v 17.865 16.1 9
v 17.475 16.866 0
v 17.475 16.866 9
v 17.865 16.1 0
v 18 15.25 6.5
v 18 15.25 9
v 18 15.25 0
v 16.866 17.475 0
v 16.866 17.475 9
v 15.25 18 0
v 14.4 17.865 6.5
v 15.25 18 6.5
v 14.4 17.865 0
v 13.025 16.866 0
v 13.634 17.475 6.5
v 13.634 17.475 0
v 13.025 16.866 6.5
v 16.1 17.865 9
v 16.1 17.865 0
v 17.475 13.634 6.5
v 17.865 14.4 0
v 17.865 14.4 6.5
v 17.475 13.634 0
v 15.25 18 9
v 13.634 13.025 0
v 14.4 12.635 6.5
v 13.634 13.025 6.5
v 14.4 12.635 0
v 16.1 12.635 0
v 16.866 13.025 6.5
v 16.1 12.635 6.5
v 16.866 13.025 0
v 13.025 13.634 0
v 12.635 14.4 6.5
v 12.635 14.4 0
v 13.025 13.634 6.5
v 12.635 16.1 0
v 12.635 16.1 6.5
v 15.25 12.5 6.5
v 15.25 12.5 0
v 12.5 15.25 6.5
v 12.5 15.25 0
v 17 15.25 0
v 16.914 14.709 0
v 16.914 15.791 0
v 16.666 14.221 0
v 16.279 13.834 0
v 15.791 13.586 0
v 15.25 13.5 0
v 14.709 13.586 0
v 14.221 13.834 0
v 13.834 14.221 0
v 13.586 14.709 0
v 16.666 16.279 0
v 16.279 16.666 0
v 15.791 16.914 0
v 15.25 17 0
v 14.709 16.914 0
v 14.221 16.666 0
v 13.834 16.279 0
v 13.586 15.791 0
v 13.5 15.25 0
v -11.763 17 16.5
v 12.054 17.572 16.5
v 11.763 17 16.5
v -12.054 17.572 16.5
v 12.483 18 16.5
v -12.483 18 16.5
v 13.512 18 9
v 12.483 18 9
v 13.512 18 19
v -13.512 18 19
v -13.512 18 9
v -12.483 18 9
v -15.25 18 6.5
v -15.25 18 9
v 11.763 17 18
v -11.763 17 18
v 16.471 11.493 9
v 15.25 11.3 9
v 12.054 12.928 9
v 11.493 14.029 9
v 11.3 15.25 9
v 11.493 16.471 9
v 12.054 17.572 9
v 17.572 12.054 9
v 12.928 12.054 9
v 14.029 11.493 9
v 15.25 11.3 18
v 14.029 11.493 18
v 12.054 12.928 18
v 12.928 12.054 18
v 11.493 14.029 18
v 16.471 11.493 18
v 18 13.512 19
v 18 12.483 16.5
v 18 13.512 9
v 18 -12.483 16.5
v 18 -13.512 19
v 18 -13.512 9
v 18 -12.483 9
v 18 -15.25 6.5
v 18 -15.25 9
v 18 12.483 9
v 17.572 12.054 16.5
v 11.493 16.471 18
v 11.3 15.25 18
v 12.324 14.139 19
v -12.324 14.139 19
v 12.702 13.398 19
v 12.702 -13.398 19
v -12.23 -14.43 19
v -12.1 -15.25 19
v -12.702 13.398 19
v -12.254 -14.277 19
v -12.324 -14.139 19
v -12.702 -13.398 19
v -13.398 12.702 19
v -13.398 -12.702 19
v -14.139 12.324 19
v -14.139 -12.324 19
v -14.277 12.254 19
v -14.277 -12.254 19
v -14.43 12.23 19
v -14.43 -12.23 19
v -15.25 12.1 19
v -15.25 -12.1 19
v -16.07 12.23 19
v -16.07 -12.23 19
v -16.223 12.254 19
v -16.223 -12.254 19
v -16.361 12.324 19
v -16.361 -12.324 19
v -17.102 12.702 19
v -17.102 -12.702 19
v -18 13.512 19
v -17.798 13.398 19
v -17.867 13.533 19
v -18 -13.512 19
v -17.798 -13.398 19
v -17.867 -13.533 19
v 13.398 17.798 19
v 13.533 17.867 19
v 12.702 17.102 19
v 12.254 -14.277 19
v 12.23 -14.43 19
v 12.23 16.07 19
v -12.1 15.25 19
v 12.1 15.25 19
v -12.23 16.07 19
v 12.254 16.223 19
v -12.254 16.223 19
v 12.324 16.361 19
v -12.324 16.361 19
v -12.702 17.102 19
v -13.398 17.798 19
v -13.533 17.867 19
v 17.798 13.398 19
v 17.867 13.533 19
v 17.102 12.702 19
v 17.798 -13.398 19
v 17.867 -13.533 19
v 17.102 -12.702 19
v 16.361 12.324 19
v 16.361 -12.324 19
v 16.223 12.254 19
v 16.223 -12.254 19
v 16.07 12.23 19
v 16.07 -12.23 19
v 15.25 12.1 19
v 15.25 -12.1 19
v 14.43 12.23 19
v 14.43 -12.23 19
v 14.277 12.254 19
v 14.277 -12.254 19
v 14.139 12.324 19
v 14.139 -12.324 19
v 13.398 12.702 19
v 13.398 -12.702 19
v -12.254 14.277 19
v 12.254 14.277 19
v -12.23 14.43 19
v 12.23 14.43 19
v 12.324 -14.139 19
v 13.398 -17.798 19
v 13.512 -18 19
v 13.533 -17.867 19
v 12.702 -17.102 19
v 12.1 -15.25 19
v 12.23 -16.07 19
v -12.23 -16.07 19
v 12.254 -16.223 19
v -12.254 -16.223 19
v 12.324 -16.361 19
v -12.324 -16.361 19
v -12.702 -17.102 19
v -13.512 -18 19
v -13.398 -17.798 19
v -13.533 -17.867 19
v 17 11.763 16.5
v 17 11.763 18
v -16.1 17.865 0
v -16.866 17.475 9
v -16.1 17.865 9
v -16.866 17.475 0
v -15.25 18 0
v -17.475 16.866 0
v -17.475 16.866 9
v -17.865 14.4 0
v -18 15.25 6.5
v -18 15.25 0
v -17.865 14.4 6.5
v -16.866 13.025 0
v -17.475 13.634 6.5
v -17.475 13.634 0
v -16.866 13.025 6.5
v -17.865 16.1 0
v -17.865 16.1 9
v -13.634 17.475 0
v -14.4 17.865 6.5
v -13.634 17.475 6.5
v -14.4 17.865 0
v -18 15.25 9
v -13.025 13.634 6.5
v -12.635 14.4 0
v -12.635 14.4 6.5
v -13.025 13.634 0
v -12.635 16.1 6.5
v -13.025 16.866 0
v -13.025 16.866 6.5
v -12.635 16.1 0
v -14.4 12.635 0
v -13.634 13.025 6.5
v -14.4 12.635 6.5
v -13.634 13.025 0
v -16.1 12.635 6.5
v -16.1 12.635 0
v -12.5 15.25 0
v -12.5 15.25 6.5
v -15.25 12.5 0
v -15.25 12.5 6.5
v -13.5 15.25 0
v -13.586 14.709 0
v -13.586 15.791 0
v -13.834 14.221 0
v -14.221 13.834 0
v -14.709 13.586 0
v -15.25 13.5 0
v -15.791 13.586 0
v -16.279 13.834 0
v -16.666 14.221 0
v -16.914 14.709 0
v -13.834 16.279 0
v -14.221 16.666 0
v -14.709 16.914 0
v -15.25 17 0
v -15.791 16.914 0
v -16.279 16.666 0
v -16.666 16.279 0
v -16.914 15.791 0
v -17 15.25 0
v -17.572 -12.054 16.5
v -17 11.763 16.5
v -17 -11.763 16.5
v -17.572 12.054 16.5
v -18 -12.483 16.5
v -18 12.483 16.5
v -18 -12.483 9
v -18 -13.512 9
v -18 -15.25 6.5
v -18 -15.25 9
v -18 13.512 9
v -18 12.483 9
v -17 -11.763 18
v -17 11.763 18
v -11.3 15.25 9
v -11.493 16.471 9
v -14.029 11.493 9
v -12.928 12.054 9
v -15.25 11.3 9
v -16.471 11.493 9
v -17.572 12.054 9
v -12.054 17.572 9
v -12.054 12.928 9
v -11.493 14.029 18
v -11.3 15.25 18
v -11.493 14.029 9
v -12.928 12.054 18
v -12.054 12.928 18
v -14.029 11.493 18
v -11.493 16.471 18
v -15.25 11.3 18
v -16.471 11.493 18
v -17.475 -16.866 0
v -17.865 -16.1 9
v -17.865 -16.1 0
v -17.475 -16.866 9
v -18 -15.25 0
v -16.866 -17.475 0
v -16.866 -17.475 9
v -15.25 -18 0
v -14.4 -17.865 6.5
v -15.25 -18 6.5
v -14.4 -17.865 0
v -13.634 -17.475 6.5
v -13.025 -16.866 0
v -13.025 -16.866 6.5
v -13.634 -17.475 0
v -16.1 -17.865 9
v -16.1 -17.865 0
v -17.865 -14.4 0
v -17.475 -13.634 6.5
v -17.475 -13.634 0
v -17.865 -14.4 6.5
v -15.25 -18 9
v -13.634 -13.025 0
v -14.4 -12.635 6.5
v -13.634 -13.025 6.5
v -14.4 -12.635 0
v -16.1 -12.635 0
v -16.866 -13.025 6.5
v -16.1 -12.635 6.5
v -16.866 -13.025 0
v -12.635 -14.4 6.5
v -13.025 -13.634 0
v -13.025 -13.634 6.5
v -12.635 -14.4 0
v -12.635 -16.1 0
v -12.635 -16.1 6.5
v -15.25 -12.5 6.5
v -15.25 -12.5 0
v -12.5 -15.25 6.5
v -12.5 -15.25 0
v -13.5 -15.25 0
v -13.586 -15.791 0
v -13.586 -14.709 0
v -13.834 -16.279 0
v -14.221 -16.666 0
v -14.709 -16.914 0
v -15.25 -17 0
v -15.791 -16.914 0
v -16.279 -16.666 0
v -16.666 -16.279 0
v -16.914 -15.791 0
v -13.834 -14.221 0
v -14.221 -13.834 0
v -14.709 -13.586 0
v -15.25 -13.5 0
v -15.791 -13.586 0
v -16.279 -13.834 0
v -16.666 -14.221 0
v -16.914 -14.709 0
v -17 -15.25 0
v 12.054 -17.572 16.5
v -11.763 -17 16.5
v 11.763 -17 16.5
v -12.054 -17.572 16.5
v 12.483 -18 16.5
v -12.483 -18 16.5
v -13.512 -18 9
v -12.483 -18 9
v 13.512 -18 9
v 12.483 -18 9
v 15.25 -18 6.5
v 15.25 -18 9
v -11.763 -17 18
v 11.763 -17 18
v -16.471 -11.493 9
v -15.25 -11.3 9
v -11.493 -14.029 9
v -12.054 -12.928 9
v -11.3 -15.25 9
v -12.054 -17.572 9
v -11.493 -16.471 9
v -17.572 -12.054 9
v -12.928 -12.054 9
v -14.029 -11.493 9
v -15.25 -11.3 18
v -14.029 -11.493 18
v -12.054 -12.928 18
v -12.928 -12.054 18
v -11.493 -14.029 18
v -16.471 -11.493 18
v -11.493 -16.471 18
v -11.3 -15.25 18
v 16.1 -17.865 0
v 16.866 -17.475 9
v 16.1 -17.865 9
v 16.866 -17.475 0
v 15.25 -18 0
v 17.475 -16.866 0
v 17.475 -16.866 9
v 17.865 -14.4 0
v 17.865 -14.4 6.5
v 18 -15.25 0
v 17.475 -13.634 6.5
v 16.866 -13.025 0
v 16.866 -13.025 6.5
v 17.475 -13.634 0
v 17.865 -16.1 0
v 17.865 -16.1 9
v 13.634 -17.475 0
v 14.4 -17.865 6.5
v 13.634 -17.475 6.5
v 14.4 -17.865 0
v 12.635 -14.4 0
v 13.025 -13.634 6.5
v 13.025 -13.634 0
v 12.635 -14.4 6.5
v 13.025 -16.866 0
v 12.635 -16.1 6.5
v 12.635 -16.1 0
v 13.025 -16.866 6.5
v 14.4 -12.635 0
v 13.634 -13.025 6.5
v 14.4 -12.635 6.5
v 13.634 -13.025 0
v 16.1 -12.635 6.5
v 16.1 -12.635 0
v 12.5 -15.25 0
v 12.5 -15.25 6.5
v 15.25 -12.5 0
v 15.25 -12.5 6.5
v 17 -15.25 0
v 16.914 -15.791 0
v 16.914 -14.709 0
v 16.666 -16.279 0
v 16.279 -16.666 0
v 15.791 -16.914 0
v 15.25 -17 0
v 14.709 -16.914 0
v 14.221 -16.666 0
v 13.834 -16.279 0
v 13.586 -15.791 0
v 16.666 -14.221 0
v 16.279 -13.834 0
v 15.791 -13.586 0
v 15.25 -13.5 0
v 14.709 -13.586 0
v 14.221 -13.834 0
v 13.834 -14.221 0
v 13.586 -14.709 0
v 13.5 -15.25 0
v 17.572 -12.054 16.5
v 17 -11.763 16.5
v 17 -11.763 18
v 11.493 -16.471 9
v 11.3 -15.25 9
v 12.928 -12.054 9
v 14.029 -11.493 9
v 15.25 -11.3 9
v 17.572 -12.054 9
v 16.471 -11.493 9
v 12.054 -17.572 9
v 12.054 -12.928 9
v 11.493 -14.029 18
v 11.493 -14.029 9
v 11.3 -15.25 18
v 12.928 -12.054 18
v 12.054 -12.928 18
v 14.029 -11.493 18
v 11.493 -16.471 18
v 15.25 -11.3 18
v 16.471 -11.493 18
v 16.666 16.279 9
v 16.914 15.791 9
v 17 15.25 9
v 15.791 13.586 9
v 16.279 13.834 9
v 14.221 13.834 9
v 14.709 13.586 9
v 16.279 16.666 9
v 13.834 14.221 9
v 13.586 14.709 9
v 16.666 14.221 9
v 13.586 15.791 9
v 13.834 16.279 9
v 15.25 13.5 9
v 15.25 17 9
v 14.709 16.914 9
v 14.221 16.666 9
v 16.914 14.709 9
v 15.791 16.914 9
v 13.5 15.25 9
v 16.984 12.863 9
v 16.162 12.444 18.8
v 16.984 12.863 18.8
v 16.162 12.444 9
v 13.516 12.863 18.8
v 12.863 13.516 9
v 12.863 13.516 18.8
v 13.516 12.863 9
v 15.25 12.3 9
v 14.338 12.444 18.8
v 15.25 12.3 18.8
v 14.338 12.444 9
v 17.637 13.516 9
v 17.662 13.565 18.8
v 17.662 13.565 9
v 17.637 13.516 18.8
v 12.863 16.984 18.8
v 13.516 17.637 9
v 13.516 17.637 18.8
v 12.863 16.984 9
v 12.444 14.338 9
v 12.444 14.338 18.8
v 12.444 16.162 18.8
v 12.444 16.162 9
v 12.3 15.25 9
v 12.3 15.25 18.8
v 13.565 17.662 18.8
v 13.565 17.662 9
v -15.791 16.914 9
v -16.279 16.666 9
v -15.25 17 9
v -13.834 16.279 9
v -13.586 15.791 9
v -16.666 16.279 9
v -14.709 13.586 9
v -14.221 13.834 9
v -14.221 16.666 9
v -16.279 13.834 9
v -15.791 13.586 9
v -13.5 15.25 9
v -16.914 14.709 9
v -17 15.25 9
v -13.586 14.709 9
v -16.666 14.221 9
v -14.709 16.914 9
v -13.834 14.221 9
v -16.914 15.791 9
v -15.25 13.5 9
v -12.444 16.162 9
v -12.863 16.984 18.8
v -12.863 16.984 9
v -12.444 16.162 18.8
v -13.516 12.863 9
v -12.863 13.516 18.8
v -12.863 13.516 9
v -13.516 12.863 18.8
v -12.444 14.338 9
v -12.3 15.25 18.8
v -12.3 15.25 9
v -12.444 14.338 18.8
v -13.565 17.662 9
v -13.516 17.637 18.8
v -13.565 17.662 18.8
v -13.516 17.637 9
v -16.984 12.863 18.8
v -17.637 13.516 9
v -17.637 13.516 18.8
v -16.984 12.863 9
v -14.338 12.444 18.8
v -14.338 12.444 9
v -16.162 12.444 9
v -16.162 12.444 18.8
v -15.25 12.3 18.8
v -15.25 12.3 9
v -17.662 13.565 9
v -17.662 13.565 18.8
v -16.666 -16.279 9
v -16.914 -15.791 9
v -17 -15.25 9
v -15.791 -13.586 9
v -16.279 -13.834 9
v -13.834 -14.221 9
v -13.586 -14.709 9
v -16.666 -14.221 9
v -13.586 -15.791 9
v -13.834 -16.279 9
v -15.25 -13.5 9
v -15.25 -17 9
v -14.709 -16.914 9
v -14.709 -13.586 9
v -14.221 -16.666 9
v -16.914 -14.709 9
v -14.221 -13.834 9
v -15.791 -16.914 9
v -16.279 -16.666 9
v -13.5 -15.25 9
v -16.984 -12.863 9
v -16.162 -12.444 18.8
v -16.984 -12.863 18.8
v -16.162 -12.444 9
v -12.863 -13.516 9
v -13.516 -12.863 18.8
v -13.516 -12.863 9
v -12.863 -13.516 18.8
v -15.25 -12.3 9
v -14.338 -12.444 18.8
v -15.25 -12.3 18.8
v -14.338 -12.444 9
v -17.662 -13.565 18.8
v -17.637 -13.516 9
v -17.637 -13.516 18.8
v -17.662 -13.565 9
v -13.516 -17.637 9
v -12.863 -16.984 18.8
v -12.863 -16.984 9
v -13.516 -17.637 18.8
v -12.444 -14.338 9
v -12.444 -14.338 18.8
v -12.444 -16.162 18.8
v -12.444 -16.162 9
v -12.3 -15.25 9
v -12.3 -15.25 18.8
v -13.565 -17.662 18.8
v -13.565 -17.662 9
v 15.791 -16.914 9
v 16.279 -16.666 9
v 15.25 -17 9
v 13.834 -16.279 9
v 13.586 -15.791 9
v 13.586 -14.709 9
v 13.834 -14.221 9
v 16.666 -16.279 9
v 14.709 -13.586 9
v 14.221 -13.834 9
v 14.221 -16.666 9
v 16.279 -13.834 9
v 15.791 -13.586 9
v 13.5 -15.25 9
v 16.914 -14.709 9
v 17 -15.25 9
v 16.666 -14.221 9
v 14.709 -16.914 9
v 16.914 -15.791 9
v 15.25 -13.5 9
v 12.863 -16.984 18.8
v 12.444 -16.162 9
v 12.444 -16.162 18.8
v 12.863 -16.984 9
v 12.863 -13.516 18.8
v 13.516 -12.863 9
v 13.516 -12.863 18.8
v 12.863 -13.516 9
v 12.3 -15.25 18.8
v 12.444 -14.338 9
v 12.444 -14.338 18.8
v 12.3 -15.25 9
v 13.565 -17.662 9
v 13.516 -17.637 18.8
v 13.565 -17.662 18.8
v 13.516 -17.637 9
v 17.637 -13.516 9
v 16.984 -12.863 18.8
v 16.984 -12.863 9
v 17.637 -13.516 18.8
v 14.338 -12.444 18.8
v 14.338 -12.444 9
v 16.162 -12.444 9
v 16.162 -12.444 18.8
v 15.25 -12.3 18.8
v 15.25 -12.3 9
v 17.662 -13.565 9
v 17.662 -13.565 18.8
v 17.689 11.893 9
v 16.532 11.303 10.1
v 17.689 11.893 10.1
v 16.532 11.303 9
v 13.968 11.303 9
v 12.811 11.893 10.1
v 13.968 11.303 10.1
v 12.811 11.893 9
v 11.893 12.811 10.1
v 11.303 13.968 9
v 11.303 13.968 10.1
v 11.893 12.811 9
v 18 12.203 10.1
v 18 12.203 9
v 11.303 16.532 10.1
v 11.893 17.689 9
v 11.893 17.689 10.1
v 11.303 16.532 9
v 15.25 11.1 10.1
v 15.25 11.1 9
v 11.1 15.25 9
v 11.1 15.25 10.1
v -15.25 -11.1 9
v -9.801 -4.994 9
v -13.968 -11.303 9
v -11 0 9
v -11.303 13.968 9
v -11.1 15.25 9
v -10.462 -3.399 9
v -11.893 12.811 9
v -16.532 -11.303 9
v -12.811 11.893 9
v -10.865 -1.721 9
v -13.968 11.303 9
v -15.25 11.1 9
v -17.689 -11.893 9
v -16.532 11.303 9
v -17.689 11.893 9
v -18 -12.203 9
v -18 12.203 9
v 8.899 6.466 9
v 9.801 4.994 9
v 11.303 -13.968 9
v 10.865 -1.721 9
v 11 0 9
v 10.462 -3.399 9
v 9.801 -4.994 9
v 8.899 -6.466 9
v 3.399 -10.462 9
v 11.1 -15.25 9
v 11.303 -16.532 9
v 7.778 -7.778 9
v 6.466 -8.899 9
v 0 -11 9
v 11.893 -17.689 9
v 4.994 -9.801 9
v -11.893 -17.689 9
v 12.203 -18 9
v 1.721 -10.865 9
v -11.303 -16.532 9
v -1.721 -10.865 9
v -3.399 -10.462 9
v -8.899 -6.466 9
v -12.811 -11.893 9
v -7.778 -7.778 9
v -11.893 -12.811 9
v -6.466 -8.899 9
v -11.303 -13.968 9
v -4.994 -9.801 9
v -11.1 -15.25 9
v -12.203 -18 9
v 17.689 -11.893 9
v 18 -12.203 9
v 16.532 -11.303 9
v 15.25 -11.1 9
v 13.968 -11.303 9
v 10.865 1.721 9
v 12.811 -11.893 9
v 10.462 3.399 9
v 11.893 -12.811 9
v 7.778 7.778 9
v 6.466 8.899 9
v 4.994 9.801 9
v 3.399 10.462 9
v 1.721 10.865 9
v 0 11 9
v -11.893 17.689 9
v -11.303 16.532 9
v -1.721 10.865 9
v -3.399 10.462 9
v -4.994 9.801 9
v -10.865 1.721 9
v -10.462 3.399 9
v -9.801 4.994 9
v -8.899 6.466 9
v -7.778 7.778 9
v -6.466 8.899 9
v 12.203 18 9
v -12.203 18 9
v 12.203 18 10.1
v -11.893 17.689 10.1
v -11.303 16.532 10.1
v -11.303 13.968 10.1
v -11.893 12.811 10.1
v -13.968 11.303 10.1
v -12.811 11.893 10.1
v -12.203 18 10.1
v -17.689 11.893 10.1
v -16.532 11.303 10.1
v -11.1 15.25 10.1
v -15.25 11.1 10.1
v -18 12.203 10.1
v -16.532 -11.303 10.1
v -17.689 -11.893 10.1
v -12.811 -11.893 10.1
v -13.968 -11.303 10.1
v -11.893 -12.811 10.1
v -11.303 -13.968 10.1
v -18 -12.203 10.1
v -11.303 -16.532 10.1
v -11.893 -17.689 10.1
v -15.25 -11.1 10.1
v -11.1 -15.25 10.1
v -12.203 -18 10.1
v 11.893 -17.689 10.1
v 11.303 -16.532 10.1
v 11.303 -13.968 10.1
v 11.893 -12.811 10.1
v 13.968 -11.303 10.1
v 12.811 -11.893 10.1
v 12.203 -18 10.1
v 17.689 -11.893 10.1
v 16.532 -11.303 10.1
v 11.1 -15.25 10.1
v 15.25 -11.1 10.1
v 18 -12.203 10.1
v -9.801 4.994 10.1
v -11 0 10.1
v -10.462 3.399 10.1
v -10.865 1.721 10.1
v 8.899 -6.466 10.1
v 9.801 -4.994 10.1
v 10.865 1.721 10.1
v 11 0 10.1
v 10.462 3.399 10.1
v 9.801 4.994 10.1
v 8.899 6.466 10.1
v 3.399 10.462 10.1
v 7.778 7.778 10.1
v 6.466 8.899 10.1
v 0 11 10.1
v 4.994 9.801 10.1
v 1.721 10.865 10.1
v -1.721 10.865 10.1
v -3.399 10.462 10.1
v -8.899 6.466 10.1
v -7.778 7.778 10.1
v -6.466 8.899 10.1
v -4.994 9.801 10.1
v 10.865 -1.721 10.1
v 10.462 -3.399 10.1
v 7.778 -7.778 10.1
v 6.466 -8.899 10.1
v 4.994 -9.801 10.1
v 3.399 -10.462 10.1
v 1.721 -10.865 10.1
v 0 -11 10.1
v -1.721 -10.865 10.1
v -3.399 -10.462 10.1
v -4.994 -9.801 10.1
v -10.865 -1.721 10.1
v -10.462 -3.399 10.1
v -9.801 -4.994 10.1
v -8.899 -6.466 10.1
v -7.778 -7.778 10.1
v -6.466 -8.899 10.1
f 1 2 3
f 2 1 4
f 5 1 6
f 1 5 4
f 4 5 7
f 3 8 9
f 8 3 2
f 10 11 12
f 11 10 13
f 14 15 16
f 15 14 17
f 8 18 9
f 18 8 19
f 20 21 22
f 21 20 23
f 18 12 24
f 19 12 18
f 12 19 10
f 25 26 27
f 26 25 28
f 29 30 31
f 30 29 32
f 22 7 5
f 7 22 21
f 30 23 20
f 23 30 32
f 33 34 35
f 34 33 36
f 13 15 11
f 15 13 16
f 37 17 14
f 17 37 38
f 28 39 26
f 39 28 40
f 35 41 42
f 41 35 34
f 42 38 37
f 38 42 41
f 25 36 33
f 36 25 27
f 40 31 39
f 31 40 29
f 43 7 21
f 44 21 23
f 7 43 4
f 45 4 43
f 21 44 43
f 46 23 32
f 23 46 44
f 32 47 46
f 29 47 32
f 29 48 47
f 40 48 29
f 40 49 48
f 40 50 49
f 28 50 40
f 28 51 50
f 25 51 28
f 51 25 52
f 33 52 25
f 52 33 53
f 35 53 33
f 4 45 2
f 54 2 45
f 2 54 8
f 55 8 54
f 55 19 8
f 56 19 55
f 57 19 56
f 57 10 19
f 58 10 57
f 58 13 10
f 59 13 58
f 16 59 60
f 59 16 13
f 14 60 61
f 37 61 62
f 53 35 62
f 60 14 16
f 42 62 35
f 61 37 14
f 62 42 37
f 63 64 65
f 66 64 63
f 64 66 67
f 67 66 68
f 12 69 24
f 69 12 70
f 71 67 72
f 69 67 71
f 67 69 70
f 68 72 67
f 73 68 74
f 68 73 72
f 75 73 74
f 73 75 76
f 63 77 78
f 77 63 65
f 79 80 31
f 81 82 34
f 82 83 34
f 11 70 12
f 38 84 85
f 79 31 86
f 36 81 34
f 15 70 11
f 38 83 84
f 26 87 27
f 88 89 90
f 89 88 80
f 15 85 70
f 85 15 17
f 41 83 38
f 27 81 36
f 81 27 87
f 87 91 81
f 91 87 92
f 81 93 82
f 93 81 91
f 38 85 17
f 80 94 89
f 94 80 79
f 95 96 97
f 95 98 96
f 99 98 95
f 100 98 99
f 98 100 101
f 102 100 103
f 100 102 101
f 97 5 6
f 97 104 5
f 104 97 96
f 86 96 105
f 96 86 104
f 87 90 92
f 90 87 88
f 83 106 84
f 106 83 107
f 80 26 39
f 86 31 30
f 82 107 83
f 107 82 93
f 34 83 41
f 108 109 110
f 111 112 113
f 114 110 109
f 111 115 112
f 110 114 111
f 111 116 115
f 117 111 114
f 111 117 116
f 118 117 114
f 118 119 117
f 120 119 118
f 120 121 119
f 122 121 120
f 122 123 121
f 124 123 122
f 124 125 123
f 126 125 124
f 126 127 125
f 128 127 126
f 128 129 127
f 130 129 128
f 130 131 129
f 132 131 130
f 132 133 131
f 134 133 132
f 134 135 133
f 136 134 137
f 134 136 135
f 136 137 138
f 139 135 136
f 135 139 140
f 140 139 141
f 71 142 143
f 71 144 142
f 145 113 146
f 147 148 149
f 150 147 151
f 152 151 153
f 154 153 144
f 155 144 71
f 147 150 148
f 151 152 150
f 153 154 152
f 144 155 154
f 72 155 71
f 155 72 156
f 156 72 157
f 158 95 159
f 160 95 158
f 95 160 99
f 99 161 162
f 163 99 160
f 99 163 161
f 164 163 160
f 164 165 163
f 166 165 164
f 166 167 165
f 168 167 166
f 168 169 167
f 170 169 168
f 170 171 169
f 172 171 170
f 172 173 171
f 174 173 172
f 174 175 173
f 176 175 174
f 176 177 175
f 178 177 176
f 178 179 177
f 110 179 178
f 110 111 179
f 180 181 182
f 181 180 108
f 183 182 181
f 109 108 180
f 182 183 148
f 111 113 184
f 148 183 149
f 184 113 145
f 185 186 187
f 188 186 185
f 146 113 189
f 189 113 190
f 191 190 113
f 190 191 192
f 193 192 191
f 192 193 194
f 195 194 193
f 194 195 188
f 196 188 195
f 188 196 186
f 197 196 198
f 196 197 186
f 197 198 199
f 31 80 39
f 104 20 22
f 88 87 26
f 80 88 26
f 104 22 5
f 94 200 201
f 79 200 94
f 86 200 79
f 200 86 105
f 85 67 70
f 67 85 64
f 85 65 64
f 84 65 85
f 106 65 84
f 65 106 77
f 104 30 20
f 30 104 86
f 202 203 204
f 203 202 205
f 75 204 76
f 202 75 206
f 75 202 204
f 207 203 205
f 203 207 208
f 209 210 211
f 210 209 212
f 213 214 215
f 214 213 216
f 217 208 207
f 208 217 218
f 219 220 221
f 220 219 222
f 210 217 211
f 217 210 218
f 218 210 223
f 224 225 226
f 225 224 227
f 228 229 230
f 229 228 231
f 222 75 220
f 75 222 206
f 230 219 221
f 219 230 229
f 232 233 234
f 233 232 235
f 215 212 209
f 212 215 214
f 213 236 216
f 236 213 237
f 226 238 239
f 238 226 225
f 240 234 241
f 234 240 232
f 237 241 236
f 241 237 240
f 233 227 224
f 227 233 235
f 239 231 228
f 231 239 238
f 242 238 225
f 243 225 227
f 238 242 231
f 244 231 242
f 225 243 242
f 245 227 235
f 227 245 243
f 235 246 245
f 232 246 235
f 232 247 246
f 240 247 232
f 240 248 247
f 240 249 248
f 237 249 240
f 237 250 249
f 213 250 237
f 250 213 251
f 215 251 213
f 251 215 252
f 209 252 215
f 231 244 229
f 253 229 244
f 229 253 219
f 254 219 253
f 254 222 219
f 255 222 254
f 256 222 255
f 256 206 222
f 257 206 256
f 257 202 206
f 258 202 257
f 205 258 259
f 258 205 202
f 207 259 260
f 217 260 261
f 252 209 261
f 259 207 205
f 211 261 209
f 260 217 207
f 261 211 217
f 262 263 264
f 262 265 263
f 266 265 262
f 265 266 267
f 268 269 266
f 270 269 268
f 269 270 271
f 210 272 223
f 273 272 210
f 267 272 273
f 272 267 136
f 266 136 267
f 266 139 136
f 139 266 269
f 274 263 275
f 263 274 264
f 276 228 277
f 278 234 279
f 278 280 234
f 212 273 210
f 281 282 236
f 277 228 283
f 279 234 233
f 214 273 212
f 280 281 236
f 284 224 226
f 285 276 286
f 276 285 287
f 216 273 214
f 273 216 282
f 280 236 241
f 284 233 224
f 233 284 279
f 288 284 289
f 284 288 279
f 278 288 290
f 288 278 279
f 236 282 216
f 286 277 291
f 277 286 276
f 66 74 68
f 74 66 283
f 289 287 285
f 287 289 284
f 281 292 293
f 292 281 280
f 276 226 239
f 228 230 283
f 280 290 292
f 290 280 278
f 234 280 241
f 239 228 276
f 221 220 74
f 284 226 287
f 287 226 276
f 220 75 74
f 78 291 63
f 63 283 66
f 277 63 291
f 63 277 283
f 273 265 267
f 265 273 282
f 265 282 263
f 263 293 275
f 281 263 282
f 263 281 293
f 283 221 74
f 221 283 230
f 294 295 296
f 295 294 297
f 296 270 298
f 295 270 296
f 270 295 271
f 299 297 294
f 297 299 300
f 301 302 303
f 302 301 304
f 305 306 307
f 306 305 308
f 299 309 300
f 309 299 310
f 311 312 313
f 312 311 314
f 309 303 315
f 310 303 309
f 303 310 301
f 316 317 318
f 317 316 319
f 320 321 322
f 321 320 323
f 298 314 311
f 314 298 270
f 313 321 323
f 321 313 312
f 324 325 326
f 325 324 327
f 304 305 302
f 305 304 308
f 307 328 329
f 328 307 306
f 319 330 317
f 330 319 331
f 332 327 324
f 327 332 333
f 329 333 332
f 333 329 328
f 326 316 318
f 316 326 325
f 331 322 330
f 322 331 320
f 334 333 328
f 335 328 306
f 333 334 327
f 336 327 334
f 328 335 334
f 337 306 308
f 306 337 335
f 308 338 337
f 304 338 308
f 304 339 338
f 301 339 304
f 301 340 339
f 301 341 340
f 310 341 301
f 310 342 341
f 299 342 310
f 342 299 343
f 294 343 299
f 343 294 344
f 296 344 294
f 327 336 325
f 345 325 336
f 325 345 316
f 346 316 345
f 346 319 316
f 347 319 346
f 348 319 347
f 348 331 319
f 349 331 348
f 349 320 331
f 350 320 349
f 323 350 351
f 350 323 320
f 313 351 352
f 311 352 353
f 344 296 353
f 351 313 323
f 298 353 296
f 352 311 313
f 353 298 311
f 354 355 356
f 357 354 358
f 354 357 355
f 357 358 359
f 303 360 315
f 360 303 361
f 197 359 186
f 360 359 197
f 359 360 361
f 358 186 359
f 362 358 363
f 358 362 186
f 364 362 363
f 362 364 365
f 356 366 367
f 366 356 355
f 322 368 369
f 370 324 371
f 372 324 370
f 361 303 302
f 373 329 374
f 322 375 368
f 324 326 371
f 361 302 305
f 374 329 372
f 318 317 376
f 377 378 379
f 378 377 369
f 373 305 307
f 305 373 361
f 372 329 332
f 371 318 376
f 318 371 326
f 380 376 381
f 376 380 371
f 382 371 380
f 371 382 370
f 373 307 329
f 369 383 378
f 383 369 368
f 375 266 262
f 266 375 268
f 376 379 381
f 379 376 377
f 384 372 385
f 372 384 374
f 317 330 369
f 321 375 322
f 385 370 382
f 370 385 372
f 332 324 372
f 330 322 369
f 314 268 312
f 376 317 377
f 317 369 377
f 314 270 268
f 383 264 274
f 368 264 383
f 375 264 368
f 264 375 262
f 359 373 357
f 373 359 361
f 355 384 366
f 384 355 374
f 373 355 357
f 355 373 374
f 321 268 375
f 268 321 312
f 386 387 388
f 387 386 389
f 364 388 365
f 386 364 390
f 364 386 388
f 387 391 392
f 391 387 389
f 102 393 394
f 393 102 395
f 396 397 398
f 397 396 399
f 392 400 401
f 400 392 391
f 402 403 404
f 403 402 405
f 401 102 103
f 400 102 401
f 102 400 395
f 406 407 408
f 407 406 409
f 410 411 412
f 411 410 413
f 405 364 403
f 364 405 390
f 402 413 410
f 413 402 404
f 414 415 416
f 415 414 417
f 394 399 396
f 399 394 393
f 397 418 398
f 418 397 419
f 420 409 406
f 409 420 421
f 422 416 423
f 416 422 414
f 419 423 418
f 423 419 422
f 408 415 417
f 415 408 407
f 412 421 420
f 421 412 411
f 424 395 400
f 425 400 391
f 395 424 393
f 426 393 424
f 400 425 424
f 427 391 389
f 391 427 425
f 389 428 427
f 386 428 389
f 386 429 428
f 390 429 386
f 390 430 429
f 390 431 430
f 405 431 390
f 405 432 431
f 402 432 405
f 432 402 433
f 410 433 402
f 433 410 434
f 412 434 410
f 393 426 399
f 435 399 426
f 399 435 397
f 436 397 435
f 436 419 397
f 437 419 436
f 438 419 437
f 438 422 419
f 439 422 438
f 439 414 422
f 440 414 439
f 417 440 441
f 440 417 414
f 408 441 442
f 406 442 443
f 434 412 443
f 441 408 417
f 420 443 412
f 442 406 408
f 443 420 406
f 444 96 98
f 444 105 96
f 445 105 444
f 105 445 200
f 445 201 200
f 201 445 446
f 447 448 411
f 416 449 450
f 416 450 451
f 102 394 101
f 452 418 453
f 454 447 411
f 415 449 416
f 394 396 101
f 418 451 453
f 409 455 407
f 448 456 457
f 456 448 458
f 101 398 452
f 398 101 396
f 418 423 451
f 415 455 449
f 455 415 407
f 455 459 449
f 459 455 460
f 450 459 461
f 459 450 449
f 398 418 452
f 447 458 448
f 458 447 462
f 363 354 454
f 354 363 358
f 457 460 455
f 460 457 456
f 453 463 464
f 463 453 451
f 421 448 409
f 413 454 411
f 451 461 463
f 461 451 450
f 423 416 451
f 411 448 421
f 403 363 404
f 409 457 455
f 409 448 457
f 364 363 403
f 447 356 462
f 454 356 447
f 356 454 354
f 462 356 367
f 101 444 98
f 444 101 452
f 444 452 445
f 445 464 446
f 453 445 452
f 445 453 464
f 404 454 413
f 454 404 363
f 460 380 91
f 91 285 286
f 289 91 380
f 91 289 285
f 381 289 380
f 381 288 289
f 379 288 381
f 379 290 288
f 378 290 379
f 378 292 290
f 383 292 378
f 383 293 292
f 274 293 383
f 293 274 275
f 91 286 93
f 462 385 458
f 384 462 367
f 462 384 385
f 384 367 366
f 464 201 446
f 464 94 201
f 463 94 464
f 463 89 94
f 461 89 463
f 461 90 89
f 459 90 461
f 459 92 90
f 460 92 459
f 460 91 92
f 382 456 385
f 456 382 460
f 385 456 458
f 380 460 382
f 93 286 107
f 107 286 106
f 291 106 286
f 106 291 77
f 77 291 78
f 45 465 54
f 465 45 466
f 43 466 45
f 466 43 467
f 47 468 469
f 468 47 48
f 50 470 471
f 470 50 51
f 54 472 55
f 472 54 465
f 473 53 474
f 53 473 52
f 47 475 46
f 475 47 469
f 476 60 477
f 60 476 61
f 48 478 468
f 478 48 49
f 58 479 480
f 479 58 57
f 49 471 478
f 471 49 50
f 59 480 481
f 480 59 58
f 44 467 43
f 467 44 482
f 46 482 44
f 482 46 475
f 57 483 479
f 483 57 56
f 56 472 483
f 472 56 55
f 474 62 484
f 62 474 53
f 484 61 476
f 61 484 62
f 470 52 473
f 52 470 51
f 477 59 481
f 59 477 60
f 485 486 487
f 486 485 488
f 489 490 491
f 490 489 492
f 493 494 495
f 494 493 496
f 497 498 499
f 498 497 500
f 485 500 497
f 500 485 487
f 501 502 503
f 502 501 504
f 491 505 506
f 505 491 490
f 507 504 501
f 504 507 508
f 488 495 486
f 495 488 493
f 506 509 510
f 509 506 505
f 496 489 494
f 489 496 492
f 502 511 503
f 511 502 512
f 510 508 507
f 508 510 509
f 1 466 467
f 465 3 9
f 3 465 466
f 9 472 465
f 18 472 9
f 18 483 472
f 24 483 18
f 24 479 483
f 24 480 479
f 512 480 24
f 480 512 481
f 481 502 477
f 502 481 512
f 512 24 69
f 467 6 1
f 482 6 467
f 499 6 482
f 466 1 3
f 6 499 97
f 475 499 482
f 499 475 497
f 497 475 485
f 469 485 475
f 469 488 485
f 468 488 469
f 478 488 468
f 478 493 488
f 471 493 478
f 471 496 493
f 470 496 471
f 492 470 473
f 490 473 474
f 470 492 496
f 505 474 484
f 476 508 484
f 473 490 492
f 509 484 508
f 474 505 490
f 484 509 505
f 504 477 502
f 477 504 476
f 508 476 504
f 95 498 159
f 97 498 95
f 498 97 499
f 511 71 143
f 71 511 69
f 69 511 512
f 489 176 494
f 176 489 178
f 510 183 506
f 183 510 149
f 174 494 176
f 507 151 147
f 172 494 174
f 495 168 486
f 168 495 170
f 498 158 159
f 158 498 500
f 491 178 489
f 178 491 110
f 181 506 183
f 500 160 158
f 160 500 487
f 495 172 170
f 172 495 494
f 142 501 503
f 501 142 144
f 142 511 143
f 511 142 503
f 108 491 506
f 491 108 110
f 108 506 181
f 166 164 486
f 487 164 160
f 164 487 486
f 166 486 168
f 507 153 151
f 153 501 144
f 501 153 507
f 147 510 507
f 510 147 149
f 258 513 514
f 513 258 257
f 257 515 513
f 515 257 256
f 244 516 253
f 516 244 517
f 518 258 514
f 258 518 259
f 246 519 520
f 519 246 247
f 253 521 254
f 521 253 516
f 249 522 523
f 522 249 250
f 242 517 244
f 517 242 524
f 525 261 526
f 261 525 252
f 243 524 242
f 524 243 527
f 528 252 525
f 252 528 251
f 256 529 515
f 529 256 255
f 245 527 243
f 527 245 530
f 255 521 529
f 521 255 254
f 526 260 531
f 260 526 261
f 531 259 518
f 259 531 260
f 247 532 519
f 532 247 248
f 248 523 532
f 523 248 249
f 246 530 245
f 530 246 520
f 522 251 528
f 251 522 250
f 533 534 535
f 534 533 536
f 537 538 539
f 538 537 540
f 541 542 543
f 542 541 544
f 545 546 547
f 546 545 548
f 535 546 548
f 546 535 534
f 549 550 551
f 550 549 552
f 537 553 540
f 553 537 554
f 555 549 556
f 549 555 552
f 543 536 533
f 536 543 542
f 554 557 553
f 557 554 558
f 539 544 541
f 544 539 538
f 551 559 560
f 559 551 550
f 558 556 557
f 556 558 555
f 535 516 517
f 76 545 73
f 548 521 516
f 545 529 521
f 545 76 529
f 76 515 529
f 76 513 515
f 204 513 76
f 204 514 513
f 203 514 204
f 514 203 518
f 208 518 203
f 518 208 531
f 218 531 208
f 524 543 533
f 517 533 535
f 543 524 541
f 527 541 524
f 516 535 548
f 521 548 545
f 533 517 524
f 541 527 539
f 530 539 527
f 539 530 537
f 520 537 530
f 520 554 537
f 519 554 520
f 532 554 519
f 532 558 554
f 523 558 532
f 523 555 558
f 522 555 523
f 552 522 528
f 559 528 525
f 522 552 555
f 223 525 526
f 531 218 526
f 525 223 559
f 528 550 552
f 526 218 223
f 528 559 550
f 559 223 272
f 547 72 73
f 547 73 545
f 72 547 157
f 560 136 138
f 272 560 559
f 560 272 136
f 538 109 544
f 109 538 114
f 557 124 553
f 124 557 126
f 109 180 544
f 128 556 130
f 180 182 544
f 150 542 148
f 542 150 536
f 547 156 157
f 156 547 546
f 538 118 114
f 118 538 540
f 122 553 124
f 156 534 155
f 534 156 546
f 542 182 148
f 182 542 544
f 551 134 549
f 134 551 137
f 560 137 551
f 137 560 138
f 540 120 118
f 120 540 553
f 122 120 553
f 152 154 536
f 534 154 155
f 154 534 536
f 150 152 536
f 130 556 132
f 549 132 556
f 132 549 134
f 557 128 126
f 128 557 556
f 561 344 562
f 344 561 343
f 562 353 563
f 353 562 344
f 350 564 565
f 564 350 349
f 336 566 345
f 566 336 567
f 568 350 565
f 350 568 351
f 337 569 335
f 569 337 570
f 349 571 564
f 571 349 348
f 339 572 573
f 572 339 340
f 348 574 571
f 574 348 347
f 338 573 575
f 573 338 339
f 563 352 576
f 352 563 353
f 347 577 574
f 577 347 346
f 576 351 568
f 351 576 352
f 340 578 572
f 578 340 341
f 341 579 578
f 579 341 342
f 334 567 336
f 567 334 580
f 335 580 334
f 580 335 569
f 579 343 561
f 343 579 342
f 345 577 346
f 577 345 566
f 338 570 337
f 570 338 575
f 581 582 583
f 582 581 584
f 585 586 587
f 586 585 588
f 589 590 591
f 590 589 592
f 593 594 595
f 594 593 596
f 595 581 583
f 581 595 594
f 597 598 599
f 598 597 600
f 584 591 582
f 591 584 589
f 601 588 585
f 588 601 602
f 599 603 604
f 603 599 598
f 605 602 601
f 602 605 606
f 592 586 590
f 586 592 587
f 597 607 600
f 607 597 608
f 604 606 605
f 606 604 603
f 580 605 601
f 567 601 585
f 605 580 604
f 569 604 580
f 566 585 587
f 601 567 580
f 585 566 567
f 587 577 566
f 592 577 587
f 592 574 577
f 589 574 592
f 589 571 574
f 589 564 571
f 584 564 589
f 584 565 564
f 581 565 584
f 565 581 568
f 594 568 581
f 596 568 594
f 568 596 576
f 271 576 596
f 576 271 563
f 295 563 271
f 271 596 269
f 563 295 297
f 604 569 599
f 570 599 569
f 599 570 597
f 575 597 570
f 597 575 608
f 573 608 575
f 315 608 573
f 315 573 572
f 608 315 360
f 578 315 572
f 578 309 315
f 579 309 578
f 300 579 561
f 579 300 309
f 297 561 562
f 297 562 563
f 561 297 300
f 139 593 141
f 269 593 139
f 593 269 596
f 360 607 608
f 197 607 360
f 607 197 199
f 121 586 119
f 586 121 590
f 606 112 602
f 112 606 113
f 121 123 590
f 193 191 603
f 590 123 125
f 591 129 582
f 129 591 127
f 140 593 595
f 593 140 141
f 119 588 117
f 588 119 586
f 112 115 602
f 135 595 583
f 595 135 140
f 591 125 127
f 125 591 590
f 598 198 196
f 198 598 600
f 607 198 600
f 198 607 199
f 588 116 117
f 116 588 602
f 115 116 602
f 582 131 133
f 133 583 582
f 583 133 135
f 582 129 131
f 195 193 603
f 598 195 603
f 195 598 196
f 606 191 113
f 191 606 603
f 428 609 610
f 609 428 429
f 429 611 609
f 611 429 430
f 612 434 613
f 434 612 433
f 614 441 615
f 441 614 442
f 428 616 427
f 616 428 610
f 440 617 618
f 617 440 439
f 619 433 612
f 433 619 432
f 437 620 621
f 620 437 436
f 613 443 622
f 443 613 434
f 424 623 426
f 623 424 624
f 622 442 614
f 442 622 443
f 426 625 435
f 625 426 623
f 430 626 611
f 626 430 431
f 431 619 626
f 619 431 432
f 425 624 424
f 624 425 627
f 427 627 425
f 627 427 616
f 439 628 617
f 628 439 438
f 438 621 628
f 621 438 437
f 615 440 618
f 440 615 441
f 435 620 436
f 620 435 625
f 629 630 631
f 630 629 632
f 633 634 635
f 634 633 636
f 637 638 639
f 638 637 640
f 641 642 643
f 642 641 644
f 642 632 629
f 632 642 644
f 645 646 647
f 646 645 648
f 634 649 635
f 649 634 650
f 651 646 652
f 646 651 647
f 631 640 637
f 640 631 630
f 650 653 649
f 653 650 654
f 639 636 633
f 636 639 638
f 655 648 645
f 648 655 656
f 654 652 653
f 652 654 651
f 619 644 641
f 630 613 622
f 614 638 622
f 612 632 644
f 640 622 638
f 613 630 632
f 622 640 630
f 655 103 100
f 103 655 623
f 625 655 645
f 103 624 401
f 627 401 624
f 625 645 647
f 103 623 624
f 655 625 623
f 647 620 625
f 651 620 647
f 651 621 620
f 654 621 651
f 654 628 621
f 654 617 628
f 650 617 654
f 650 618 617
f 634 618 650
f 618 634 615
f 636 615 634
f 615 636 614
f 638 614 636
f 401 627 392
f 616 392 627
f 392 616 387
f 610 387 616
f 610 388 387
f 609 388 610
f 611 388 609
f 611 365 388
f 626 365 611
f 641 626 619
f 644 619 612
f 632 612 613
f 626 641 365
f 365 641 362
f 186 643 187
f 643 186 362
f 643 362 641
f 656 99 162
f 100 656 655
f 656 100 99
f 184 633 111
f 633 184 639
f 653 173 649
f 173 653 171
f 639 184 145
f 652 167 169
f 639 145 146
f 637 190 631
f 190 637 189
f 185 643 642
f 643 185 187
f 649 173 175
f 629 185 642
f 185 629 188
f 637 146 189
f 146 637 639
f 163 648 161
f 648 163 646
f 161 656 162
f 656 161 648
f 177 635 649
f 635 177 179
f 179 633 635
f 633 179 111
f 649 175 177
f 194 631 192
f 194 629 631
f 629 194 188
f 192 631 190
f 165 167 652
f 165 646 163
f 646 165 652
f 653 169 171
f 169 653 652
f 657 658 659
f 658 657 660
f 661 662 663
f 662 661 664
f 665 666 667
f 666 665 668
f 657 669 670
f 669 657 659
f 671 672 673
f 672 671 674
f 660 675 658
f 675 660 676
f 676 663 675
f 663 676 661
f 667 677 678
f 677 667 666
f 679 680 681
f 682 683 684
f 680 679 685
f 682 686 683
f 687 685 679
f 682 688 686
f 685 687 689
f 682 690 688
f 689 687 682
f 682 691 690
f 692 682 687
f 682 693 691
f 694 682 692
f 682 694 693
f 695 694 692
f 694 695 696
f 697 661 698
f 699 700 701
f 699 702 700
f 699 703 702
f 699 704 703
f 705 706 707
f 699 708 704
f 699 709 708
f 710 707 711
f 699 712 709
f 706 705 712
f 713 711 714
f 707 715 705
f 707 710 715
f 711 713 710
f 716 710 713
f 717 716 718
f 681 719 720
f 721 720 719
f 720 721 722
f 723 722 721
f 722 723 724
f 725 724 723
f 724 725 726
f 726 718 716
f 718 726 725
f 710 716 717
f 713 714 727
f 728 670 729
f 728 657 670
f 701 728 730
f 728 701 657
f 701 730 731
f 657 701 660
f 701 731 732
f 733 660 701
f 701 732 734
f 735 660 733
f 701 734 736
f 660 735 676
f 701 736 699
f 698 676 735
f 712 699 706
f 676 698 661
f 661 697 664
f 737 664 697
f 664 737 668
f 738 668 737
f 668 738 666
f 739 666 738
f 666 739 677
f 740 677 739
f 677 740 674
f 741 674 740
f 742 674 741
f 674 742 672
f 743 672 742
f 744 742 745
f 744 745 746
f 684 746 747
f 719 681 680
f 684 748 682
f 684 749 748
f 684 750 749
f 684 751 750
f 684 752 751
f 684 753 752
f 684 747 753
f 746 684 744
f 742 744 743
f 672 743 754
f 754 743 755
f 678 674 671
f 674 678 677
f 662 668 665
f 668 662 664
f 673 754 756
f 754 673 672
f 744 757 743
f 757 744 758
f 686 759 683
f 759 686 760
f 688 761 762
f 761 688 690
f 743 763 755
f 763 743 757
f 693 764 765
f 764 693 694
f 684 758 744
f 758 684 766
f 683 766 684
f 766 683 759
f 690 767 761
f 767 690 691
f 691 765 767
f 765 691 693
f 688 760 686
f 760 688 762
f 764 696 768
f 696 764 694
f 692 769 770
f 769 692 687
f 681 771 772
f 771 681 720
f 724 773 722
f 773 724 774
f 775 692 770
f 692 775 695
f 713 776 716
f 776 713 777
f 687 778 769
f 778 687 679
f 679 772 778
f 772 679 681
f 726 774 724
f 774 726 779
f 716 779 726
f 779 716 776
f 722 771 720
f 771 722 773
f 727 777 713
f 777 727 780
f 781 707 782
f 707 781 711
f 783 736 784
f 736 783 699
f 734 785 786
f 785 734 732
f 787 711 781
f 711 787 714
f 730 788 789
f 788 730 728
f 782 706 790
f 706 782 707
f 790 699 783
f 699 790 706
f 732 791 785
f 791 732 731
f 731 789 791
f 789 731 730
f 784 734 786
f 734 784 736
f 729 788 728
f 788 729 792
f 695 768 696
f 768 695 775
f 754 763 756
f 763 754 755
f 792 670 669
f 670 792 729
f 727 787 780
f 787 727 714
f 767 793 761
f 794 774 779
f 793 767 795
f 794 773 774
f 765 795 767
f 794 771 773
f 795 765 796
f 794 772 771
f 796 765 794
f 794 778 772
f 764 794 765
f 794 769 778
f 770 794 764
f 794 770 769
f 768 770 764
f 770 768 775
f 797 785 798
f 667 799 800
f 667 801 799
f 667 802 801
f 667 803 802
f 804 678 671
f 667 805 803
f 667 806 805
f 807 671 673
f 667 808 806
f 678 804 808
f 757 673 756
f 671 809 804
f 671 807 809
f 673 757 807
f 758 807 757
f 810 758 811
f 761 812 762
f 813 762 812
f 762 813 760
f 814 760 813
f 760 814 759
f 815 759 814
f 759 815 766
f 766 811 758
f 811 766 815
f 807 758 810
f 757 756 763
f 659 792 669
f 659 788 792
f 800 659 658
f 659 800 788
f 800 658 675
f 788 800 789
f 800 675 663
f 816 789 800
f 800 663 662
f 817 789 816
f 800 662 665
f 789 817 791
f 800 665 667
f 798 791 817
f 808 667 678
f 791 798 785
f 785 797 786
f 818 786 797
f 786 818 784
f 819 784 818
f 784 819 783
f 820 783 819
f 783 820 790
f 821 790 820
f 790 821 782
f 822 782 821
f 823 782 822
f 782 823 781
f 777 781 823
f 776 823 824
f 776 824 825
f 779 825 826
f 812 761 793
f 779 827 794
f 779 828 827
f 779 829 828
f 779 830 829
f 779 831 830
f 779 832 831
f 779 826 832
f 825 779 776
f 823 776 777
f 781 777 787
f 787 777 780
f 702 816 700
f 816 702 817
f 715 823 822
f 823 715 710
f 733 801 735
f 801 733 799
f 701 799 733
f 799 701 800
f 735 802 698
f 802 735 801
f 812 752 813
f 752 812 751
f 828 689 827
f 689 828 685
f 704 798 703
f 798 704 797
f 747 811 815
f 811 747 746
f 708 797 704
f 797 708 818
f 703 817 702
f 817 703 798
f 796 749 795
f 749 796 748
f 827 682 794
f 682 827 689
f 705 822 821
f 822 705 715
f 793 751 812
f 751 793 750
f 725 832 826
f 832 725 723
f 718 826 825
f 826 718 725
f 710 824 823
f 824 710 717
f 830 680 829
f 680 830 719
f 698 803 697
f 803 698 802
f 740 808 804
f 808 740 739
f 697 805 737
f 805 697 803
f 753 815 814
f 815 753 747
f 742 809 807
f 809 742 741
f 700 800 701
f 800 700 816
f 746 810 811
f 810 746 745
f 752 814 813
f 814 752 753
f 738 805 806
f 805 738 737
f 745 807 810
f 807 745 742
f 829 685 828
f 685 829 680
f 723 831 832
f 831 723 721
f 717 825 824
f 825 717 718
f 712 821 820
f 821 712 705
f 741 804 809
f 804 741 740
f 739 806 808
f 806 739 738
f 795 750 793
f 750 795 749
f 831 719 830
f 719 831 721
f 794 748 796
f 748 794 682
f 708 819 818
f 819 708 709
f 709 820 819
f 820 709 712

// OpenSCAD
//**********************************************
//       GPS Cover Dome for Quadcopter 30.5 x 30.5mm FC
//  Source Code and created objects are free for private use
//              (C) Henning Stöcklein   18.10.2015

//********** Change log **********************************
// 18.10.2015   Created as split off my FNQ Foldable Quadcopter Source
// 24.10.2015   Screw top head chamfer added, optional top hole added
//********** End Change log *******************************

/* [Object Selection] */

// What to print
visible = "all" ; // ["all", "top plate", "level plate"]

// Support Structure 
Support = 0 ;  // [0:No, 1:Yes]


/* [Base geometry] */

// Footprint Hole Distance
fhd = 30.5 ;

// Dome height
h_dome = 18.0; // [8:30]

// Top Plate thickness
h_Plate = 1.0 ;

// Plate Border height
h_Bord = 2.0 ;

// Weight reduction hole diameter
tophole_dia = 0 ; // [0:28]

// Cylinder Outer Diameter
Cyl_Dia = 5.5 ;

// Cylinder Segment Wall Thickness
Cyl_Wall = 1.2 ;

// Screw Hole Diameter
M3_Dia = 3.5 ;

// Screw Head Sink Diameter
M3_Sink_dia = 5.9 ;
    
// Screw Head Sink Depth (0=Flat on top)
M3_Sink_ht = 10 ;

// Screw Head Hole Chamfer depth
M3_Head_Chamfer = 0.2 ;

/* [Intermediate plate] */

// Level plate Z position
z_level = 9 ; // [9:22]

// Level plate thickness
h_level = 1.1 ;

// Gap between domes and level plate
Gap_level = 0.2 ;

// Weight reduction hole diameter
level_dia = 22 ; // [0:28]


//*******************************************
//*  Select here what to print
//*******************************************
if (visible == "all") {
    coverdome() ;
    levelplate() ;
}

if (visible == "top plate") {
    coverdome() ;
}

if (visible == "level plate") {
    levelplate() ;
}
    
// *************************************************
//    Cover dome for 30.5 x 30.5 FC footprint
// *************************************************
module coverdome()
{
   // Holder for FC footprint 30.5x30.5 (e.g. Naze32)
   difference() {
      union() {
		// Top plate = Round cube
        translate ([0,0,h_dome]) 
          hull() {
            translate ([+fhd/2,+fhd/2,0]) cylinder (r=Cyl_Dia/2, h=h_Plate, $fn=20) ;
            translate ([+fhd/2,-fhd/2,0]) cylinder (r=Cyl_Dia/2, h=h_Plate, $fn=20) ;		
            translate ([-fhd/2,+fhd/2,0]) cylinder (r=Cyl_Dia/2, h=h_Plate, $fn=20) ;		
            translate ([-fhd/2,-fhd/2,0]) cylinder (r=Cyl_Dia/2, h=h_Plate, $fn=20) ;		
        } // hull
        
        // 4 cylindrical legs with screw holes
        for (i=[0:90:350])
        {
            rotate ([0,0,i]) 
            {
        		// Domes for M3 screws
                translate ([+fhd/2,+fhd/2,0]) cylinder (r=Cyl_Dia/2, h=h_dome, $fn=20) ;

        	    // Small side wall
                translate ([0,+fhd/2+Cyl_Dia/2-h_Plate/2,h_dome-h_Plate/2]) 
                    cube ([fhd, h_Plate, h_Bord], center=true) ;

         		// Dome strengthening segments
                hull () 
                {
                intersection () {
                     translate ([+fhd/2,+fhd/2,h_dome+h_Plate-M3_Sink_ht])
                        cylinder (r=Cyl_Wall+Cyl_Dia/2, h=M3_Sink_ht, $fn=20) ;
                     hullplate() ;
                  } // intersection
                  translate ([+fhd/2,+fhd/2,h_dome+h_Plate-M3_Sink_ht-2.5]) 
                      cylinder (r=Cyl_Dia/2, h=0.1, $fn=20) ;
                 } // hull
             } // rotate
         } // for        
      } // union
      
      // Cutout objects for 4 screw holes
      for (i=[0:90:350])
      {
          rotate ([0,0,i]) 
          {
        	  // Holes for M3 bolts
              translate ([+fhd/2,+fhd/2,0]) 
                  cylinder (r=M3_Dia/2, h=50, $fn=20, center=true) ;
      
        	  // Sink Holes for M3 heads
              translate ([+fhd/2,+fhd/2,h_dome+h_Plate-M3_Sink_ht]) 
                  cylinder (r=M3_Sink_dia/2, h=M3_Sink_ht+0.05, $fn=20) ; 

        	  // Chamfer Cylinder for segmented area (if any)
              translate ([+fhd/2+M3_Sink_dia/2,+fhd/2+M3_Sink_dia/2,h_dome+h_Plate-M3_Sink_ht]) 
                  cylinder (r=M3_Sink_dia/1.25, h=M3_Sink_ht+0.05, $fn=20) ; 

        	  // Chamfer Cylinder at top screw hole cutout (if any)
              translate ([+fhd/2,+fhd/2,h_dome+h_Plate-M3_Head_Chamfer]) 
                  cylinder (r1=M3_Sink_dia/2, r2=M3_Sink_dia/2+2, h=2, $fn=20) ; 
          } // rotate
      } // for
      
      // Weight reduction hole
      translate ([0,0,h_dome]) cylinder (r=tophole_dia/2, h=h_Plate+3, $fn=40, center=true) ;  

   } // difference
   
   // Support structure (if cutout legs)
   if (Support == 1) {
     for (i=[0:90:350])
     { 
        rotate ([0,0,i]) 
        {
           translate ([+fhd/2+Cyl_Dia/3,+fhd/2+Cyl_Dia/3,h_dome+h_Plate-M3_Sink_ht]) 
               cylinder (r=0.8, h=M3_Sink_ht+0.05, $fn=20) ; 
        } // rotate
    } // for
  } // if
}

//********************************************
// Additional plate can be fixed in the middle of the Domes
//********************************************
module levelplate()
{
   // Intermediate level to fix GPS module
   difference() {
      union() {
		// Plate = Round cube
        translate ([0,0,z_level]) 
          hull() {
            translate ([+fhd/2,+fhd/2,0]) cylinder (r=Cyl_Dia/2, h=h_level, $fn=20) ;
            translate ([+fhd/2,-fhd/2,0]) cylinder (r=Cyl_Dia/2, h=h_level, $fn=20) ;		
            translate ([-fhd/2,+fhd/2,0]) cylinder (r=Cyl_Dia/2, h=h_level, $fn=20) ;		
            translate ([-fhd/2,-fhd/2,0]) cylinder (r=Cyl_Dia/2, h=h_level, $fn=20) ;		
        } // hull
      } // union

      // Weight reduction hole
      translate ([0,0,z_level]) cylinder (r=level_dia/2, h=h_level+2, $fn=40, center=true) ; 
        
      // 4 cylindrical legs with screw holes
      for (i=[0:90:350])
      {
          rotate ([0,0,i]) 
          {
        		// Holes for Domes 
                translate ([+fhd/2,+fhd/2,0]) 
                    cylinder (r=Cyl_Dia/2+Gap_level, h=h_dome, $fn=20) ;

                // Holes for Strengthening Dome Segments              
                translate ([+fhd/2,+fhd/2,h_dome+h_Plate-M3_Sink_ht])
                     cylinder (r=Cyl_Wall+Cyl_Dia/2+Gap_level, h=M3_Sink_ht, $fn=20) ;
          } // rotate
      } // for
  } // difference
}

module hullplate()
{
    // Top plate = Round cube
    hull() {
            translate ([+fhd/2,+fhd/2,0]) cylinder (r=Cyl_Dia/2, h=40, $fn=20) ;
            translate ([+fhd/2,-fhd/2,0]) cylinder (r=Cyl_Dia/2, h=40, $fn=20) ;		
            translate ([-fhd/2,+fhd/2,0]) cylinder (r=Cyl_Dia/2, h=40, $fn=20) ;		
            translate ([-fhd/2,-fhd/2,0]) cylinder (r=Cyl_Dia/2, h=40, $fn=20) ;		
   } // hull
}
